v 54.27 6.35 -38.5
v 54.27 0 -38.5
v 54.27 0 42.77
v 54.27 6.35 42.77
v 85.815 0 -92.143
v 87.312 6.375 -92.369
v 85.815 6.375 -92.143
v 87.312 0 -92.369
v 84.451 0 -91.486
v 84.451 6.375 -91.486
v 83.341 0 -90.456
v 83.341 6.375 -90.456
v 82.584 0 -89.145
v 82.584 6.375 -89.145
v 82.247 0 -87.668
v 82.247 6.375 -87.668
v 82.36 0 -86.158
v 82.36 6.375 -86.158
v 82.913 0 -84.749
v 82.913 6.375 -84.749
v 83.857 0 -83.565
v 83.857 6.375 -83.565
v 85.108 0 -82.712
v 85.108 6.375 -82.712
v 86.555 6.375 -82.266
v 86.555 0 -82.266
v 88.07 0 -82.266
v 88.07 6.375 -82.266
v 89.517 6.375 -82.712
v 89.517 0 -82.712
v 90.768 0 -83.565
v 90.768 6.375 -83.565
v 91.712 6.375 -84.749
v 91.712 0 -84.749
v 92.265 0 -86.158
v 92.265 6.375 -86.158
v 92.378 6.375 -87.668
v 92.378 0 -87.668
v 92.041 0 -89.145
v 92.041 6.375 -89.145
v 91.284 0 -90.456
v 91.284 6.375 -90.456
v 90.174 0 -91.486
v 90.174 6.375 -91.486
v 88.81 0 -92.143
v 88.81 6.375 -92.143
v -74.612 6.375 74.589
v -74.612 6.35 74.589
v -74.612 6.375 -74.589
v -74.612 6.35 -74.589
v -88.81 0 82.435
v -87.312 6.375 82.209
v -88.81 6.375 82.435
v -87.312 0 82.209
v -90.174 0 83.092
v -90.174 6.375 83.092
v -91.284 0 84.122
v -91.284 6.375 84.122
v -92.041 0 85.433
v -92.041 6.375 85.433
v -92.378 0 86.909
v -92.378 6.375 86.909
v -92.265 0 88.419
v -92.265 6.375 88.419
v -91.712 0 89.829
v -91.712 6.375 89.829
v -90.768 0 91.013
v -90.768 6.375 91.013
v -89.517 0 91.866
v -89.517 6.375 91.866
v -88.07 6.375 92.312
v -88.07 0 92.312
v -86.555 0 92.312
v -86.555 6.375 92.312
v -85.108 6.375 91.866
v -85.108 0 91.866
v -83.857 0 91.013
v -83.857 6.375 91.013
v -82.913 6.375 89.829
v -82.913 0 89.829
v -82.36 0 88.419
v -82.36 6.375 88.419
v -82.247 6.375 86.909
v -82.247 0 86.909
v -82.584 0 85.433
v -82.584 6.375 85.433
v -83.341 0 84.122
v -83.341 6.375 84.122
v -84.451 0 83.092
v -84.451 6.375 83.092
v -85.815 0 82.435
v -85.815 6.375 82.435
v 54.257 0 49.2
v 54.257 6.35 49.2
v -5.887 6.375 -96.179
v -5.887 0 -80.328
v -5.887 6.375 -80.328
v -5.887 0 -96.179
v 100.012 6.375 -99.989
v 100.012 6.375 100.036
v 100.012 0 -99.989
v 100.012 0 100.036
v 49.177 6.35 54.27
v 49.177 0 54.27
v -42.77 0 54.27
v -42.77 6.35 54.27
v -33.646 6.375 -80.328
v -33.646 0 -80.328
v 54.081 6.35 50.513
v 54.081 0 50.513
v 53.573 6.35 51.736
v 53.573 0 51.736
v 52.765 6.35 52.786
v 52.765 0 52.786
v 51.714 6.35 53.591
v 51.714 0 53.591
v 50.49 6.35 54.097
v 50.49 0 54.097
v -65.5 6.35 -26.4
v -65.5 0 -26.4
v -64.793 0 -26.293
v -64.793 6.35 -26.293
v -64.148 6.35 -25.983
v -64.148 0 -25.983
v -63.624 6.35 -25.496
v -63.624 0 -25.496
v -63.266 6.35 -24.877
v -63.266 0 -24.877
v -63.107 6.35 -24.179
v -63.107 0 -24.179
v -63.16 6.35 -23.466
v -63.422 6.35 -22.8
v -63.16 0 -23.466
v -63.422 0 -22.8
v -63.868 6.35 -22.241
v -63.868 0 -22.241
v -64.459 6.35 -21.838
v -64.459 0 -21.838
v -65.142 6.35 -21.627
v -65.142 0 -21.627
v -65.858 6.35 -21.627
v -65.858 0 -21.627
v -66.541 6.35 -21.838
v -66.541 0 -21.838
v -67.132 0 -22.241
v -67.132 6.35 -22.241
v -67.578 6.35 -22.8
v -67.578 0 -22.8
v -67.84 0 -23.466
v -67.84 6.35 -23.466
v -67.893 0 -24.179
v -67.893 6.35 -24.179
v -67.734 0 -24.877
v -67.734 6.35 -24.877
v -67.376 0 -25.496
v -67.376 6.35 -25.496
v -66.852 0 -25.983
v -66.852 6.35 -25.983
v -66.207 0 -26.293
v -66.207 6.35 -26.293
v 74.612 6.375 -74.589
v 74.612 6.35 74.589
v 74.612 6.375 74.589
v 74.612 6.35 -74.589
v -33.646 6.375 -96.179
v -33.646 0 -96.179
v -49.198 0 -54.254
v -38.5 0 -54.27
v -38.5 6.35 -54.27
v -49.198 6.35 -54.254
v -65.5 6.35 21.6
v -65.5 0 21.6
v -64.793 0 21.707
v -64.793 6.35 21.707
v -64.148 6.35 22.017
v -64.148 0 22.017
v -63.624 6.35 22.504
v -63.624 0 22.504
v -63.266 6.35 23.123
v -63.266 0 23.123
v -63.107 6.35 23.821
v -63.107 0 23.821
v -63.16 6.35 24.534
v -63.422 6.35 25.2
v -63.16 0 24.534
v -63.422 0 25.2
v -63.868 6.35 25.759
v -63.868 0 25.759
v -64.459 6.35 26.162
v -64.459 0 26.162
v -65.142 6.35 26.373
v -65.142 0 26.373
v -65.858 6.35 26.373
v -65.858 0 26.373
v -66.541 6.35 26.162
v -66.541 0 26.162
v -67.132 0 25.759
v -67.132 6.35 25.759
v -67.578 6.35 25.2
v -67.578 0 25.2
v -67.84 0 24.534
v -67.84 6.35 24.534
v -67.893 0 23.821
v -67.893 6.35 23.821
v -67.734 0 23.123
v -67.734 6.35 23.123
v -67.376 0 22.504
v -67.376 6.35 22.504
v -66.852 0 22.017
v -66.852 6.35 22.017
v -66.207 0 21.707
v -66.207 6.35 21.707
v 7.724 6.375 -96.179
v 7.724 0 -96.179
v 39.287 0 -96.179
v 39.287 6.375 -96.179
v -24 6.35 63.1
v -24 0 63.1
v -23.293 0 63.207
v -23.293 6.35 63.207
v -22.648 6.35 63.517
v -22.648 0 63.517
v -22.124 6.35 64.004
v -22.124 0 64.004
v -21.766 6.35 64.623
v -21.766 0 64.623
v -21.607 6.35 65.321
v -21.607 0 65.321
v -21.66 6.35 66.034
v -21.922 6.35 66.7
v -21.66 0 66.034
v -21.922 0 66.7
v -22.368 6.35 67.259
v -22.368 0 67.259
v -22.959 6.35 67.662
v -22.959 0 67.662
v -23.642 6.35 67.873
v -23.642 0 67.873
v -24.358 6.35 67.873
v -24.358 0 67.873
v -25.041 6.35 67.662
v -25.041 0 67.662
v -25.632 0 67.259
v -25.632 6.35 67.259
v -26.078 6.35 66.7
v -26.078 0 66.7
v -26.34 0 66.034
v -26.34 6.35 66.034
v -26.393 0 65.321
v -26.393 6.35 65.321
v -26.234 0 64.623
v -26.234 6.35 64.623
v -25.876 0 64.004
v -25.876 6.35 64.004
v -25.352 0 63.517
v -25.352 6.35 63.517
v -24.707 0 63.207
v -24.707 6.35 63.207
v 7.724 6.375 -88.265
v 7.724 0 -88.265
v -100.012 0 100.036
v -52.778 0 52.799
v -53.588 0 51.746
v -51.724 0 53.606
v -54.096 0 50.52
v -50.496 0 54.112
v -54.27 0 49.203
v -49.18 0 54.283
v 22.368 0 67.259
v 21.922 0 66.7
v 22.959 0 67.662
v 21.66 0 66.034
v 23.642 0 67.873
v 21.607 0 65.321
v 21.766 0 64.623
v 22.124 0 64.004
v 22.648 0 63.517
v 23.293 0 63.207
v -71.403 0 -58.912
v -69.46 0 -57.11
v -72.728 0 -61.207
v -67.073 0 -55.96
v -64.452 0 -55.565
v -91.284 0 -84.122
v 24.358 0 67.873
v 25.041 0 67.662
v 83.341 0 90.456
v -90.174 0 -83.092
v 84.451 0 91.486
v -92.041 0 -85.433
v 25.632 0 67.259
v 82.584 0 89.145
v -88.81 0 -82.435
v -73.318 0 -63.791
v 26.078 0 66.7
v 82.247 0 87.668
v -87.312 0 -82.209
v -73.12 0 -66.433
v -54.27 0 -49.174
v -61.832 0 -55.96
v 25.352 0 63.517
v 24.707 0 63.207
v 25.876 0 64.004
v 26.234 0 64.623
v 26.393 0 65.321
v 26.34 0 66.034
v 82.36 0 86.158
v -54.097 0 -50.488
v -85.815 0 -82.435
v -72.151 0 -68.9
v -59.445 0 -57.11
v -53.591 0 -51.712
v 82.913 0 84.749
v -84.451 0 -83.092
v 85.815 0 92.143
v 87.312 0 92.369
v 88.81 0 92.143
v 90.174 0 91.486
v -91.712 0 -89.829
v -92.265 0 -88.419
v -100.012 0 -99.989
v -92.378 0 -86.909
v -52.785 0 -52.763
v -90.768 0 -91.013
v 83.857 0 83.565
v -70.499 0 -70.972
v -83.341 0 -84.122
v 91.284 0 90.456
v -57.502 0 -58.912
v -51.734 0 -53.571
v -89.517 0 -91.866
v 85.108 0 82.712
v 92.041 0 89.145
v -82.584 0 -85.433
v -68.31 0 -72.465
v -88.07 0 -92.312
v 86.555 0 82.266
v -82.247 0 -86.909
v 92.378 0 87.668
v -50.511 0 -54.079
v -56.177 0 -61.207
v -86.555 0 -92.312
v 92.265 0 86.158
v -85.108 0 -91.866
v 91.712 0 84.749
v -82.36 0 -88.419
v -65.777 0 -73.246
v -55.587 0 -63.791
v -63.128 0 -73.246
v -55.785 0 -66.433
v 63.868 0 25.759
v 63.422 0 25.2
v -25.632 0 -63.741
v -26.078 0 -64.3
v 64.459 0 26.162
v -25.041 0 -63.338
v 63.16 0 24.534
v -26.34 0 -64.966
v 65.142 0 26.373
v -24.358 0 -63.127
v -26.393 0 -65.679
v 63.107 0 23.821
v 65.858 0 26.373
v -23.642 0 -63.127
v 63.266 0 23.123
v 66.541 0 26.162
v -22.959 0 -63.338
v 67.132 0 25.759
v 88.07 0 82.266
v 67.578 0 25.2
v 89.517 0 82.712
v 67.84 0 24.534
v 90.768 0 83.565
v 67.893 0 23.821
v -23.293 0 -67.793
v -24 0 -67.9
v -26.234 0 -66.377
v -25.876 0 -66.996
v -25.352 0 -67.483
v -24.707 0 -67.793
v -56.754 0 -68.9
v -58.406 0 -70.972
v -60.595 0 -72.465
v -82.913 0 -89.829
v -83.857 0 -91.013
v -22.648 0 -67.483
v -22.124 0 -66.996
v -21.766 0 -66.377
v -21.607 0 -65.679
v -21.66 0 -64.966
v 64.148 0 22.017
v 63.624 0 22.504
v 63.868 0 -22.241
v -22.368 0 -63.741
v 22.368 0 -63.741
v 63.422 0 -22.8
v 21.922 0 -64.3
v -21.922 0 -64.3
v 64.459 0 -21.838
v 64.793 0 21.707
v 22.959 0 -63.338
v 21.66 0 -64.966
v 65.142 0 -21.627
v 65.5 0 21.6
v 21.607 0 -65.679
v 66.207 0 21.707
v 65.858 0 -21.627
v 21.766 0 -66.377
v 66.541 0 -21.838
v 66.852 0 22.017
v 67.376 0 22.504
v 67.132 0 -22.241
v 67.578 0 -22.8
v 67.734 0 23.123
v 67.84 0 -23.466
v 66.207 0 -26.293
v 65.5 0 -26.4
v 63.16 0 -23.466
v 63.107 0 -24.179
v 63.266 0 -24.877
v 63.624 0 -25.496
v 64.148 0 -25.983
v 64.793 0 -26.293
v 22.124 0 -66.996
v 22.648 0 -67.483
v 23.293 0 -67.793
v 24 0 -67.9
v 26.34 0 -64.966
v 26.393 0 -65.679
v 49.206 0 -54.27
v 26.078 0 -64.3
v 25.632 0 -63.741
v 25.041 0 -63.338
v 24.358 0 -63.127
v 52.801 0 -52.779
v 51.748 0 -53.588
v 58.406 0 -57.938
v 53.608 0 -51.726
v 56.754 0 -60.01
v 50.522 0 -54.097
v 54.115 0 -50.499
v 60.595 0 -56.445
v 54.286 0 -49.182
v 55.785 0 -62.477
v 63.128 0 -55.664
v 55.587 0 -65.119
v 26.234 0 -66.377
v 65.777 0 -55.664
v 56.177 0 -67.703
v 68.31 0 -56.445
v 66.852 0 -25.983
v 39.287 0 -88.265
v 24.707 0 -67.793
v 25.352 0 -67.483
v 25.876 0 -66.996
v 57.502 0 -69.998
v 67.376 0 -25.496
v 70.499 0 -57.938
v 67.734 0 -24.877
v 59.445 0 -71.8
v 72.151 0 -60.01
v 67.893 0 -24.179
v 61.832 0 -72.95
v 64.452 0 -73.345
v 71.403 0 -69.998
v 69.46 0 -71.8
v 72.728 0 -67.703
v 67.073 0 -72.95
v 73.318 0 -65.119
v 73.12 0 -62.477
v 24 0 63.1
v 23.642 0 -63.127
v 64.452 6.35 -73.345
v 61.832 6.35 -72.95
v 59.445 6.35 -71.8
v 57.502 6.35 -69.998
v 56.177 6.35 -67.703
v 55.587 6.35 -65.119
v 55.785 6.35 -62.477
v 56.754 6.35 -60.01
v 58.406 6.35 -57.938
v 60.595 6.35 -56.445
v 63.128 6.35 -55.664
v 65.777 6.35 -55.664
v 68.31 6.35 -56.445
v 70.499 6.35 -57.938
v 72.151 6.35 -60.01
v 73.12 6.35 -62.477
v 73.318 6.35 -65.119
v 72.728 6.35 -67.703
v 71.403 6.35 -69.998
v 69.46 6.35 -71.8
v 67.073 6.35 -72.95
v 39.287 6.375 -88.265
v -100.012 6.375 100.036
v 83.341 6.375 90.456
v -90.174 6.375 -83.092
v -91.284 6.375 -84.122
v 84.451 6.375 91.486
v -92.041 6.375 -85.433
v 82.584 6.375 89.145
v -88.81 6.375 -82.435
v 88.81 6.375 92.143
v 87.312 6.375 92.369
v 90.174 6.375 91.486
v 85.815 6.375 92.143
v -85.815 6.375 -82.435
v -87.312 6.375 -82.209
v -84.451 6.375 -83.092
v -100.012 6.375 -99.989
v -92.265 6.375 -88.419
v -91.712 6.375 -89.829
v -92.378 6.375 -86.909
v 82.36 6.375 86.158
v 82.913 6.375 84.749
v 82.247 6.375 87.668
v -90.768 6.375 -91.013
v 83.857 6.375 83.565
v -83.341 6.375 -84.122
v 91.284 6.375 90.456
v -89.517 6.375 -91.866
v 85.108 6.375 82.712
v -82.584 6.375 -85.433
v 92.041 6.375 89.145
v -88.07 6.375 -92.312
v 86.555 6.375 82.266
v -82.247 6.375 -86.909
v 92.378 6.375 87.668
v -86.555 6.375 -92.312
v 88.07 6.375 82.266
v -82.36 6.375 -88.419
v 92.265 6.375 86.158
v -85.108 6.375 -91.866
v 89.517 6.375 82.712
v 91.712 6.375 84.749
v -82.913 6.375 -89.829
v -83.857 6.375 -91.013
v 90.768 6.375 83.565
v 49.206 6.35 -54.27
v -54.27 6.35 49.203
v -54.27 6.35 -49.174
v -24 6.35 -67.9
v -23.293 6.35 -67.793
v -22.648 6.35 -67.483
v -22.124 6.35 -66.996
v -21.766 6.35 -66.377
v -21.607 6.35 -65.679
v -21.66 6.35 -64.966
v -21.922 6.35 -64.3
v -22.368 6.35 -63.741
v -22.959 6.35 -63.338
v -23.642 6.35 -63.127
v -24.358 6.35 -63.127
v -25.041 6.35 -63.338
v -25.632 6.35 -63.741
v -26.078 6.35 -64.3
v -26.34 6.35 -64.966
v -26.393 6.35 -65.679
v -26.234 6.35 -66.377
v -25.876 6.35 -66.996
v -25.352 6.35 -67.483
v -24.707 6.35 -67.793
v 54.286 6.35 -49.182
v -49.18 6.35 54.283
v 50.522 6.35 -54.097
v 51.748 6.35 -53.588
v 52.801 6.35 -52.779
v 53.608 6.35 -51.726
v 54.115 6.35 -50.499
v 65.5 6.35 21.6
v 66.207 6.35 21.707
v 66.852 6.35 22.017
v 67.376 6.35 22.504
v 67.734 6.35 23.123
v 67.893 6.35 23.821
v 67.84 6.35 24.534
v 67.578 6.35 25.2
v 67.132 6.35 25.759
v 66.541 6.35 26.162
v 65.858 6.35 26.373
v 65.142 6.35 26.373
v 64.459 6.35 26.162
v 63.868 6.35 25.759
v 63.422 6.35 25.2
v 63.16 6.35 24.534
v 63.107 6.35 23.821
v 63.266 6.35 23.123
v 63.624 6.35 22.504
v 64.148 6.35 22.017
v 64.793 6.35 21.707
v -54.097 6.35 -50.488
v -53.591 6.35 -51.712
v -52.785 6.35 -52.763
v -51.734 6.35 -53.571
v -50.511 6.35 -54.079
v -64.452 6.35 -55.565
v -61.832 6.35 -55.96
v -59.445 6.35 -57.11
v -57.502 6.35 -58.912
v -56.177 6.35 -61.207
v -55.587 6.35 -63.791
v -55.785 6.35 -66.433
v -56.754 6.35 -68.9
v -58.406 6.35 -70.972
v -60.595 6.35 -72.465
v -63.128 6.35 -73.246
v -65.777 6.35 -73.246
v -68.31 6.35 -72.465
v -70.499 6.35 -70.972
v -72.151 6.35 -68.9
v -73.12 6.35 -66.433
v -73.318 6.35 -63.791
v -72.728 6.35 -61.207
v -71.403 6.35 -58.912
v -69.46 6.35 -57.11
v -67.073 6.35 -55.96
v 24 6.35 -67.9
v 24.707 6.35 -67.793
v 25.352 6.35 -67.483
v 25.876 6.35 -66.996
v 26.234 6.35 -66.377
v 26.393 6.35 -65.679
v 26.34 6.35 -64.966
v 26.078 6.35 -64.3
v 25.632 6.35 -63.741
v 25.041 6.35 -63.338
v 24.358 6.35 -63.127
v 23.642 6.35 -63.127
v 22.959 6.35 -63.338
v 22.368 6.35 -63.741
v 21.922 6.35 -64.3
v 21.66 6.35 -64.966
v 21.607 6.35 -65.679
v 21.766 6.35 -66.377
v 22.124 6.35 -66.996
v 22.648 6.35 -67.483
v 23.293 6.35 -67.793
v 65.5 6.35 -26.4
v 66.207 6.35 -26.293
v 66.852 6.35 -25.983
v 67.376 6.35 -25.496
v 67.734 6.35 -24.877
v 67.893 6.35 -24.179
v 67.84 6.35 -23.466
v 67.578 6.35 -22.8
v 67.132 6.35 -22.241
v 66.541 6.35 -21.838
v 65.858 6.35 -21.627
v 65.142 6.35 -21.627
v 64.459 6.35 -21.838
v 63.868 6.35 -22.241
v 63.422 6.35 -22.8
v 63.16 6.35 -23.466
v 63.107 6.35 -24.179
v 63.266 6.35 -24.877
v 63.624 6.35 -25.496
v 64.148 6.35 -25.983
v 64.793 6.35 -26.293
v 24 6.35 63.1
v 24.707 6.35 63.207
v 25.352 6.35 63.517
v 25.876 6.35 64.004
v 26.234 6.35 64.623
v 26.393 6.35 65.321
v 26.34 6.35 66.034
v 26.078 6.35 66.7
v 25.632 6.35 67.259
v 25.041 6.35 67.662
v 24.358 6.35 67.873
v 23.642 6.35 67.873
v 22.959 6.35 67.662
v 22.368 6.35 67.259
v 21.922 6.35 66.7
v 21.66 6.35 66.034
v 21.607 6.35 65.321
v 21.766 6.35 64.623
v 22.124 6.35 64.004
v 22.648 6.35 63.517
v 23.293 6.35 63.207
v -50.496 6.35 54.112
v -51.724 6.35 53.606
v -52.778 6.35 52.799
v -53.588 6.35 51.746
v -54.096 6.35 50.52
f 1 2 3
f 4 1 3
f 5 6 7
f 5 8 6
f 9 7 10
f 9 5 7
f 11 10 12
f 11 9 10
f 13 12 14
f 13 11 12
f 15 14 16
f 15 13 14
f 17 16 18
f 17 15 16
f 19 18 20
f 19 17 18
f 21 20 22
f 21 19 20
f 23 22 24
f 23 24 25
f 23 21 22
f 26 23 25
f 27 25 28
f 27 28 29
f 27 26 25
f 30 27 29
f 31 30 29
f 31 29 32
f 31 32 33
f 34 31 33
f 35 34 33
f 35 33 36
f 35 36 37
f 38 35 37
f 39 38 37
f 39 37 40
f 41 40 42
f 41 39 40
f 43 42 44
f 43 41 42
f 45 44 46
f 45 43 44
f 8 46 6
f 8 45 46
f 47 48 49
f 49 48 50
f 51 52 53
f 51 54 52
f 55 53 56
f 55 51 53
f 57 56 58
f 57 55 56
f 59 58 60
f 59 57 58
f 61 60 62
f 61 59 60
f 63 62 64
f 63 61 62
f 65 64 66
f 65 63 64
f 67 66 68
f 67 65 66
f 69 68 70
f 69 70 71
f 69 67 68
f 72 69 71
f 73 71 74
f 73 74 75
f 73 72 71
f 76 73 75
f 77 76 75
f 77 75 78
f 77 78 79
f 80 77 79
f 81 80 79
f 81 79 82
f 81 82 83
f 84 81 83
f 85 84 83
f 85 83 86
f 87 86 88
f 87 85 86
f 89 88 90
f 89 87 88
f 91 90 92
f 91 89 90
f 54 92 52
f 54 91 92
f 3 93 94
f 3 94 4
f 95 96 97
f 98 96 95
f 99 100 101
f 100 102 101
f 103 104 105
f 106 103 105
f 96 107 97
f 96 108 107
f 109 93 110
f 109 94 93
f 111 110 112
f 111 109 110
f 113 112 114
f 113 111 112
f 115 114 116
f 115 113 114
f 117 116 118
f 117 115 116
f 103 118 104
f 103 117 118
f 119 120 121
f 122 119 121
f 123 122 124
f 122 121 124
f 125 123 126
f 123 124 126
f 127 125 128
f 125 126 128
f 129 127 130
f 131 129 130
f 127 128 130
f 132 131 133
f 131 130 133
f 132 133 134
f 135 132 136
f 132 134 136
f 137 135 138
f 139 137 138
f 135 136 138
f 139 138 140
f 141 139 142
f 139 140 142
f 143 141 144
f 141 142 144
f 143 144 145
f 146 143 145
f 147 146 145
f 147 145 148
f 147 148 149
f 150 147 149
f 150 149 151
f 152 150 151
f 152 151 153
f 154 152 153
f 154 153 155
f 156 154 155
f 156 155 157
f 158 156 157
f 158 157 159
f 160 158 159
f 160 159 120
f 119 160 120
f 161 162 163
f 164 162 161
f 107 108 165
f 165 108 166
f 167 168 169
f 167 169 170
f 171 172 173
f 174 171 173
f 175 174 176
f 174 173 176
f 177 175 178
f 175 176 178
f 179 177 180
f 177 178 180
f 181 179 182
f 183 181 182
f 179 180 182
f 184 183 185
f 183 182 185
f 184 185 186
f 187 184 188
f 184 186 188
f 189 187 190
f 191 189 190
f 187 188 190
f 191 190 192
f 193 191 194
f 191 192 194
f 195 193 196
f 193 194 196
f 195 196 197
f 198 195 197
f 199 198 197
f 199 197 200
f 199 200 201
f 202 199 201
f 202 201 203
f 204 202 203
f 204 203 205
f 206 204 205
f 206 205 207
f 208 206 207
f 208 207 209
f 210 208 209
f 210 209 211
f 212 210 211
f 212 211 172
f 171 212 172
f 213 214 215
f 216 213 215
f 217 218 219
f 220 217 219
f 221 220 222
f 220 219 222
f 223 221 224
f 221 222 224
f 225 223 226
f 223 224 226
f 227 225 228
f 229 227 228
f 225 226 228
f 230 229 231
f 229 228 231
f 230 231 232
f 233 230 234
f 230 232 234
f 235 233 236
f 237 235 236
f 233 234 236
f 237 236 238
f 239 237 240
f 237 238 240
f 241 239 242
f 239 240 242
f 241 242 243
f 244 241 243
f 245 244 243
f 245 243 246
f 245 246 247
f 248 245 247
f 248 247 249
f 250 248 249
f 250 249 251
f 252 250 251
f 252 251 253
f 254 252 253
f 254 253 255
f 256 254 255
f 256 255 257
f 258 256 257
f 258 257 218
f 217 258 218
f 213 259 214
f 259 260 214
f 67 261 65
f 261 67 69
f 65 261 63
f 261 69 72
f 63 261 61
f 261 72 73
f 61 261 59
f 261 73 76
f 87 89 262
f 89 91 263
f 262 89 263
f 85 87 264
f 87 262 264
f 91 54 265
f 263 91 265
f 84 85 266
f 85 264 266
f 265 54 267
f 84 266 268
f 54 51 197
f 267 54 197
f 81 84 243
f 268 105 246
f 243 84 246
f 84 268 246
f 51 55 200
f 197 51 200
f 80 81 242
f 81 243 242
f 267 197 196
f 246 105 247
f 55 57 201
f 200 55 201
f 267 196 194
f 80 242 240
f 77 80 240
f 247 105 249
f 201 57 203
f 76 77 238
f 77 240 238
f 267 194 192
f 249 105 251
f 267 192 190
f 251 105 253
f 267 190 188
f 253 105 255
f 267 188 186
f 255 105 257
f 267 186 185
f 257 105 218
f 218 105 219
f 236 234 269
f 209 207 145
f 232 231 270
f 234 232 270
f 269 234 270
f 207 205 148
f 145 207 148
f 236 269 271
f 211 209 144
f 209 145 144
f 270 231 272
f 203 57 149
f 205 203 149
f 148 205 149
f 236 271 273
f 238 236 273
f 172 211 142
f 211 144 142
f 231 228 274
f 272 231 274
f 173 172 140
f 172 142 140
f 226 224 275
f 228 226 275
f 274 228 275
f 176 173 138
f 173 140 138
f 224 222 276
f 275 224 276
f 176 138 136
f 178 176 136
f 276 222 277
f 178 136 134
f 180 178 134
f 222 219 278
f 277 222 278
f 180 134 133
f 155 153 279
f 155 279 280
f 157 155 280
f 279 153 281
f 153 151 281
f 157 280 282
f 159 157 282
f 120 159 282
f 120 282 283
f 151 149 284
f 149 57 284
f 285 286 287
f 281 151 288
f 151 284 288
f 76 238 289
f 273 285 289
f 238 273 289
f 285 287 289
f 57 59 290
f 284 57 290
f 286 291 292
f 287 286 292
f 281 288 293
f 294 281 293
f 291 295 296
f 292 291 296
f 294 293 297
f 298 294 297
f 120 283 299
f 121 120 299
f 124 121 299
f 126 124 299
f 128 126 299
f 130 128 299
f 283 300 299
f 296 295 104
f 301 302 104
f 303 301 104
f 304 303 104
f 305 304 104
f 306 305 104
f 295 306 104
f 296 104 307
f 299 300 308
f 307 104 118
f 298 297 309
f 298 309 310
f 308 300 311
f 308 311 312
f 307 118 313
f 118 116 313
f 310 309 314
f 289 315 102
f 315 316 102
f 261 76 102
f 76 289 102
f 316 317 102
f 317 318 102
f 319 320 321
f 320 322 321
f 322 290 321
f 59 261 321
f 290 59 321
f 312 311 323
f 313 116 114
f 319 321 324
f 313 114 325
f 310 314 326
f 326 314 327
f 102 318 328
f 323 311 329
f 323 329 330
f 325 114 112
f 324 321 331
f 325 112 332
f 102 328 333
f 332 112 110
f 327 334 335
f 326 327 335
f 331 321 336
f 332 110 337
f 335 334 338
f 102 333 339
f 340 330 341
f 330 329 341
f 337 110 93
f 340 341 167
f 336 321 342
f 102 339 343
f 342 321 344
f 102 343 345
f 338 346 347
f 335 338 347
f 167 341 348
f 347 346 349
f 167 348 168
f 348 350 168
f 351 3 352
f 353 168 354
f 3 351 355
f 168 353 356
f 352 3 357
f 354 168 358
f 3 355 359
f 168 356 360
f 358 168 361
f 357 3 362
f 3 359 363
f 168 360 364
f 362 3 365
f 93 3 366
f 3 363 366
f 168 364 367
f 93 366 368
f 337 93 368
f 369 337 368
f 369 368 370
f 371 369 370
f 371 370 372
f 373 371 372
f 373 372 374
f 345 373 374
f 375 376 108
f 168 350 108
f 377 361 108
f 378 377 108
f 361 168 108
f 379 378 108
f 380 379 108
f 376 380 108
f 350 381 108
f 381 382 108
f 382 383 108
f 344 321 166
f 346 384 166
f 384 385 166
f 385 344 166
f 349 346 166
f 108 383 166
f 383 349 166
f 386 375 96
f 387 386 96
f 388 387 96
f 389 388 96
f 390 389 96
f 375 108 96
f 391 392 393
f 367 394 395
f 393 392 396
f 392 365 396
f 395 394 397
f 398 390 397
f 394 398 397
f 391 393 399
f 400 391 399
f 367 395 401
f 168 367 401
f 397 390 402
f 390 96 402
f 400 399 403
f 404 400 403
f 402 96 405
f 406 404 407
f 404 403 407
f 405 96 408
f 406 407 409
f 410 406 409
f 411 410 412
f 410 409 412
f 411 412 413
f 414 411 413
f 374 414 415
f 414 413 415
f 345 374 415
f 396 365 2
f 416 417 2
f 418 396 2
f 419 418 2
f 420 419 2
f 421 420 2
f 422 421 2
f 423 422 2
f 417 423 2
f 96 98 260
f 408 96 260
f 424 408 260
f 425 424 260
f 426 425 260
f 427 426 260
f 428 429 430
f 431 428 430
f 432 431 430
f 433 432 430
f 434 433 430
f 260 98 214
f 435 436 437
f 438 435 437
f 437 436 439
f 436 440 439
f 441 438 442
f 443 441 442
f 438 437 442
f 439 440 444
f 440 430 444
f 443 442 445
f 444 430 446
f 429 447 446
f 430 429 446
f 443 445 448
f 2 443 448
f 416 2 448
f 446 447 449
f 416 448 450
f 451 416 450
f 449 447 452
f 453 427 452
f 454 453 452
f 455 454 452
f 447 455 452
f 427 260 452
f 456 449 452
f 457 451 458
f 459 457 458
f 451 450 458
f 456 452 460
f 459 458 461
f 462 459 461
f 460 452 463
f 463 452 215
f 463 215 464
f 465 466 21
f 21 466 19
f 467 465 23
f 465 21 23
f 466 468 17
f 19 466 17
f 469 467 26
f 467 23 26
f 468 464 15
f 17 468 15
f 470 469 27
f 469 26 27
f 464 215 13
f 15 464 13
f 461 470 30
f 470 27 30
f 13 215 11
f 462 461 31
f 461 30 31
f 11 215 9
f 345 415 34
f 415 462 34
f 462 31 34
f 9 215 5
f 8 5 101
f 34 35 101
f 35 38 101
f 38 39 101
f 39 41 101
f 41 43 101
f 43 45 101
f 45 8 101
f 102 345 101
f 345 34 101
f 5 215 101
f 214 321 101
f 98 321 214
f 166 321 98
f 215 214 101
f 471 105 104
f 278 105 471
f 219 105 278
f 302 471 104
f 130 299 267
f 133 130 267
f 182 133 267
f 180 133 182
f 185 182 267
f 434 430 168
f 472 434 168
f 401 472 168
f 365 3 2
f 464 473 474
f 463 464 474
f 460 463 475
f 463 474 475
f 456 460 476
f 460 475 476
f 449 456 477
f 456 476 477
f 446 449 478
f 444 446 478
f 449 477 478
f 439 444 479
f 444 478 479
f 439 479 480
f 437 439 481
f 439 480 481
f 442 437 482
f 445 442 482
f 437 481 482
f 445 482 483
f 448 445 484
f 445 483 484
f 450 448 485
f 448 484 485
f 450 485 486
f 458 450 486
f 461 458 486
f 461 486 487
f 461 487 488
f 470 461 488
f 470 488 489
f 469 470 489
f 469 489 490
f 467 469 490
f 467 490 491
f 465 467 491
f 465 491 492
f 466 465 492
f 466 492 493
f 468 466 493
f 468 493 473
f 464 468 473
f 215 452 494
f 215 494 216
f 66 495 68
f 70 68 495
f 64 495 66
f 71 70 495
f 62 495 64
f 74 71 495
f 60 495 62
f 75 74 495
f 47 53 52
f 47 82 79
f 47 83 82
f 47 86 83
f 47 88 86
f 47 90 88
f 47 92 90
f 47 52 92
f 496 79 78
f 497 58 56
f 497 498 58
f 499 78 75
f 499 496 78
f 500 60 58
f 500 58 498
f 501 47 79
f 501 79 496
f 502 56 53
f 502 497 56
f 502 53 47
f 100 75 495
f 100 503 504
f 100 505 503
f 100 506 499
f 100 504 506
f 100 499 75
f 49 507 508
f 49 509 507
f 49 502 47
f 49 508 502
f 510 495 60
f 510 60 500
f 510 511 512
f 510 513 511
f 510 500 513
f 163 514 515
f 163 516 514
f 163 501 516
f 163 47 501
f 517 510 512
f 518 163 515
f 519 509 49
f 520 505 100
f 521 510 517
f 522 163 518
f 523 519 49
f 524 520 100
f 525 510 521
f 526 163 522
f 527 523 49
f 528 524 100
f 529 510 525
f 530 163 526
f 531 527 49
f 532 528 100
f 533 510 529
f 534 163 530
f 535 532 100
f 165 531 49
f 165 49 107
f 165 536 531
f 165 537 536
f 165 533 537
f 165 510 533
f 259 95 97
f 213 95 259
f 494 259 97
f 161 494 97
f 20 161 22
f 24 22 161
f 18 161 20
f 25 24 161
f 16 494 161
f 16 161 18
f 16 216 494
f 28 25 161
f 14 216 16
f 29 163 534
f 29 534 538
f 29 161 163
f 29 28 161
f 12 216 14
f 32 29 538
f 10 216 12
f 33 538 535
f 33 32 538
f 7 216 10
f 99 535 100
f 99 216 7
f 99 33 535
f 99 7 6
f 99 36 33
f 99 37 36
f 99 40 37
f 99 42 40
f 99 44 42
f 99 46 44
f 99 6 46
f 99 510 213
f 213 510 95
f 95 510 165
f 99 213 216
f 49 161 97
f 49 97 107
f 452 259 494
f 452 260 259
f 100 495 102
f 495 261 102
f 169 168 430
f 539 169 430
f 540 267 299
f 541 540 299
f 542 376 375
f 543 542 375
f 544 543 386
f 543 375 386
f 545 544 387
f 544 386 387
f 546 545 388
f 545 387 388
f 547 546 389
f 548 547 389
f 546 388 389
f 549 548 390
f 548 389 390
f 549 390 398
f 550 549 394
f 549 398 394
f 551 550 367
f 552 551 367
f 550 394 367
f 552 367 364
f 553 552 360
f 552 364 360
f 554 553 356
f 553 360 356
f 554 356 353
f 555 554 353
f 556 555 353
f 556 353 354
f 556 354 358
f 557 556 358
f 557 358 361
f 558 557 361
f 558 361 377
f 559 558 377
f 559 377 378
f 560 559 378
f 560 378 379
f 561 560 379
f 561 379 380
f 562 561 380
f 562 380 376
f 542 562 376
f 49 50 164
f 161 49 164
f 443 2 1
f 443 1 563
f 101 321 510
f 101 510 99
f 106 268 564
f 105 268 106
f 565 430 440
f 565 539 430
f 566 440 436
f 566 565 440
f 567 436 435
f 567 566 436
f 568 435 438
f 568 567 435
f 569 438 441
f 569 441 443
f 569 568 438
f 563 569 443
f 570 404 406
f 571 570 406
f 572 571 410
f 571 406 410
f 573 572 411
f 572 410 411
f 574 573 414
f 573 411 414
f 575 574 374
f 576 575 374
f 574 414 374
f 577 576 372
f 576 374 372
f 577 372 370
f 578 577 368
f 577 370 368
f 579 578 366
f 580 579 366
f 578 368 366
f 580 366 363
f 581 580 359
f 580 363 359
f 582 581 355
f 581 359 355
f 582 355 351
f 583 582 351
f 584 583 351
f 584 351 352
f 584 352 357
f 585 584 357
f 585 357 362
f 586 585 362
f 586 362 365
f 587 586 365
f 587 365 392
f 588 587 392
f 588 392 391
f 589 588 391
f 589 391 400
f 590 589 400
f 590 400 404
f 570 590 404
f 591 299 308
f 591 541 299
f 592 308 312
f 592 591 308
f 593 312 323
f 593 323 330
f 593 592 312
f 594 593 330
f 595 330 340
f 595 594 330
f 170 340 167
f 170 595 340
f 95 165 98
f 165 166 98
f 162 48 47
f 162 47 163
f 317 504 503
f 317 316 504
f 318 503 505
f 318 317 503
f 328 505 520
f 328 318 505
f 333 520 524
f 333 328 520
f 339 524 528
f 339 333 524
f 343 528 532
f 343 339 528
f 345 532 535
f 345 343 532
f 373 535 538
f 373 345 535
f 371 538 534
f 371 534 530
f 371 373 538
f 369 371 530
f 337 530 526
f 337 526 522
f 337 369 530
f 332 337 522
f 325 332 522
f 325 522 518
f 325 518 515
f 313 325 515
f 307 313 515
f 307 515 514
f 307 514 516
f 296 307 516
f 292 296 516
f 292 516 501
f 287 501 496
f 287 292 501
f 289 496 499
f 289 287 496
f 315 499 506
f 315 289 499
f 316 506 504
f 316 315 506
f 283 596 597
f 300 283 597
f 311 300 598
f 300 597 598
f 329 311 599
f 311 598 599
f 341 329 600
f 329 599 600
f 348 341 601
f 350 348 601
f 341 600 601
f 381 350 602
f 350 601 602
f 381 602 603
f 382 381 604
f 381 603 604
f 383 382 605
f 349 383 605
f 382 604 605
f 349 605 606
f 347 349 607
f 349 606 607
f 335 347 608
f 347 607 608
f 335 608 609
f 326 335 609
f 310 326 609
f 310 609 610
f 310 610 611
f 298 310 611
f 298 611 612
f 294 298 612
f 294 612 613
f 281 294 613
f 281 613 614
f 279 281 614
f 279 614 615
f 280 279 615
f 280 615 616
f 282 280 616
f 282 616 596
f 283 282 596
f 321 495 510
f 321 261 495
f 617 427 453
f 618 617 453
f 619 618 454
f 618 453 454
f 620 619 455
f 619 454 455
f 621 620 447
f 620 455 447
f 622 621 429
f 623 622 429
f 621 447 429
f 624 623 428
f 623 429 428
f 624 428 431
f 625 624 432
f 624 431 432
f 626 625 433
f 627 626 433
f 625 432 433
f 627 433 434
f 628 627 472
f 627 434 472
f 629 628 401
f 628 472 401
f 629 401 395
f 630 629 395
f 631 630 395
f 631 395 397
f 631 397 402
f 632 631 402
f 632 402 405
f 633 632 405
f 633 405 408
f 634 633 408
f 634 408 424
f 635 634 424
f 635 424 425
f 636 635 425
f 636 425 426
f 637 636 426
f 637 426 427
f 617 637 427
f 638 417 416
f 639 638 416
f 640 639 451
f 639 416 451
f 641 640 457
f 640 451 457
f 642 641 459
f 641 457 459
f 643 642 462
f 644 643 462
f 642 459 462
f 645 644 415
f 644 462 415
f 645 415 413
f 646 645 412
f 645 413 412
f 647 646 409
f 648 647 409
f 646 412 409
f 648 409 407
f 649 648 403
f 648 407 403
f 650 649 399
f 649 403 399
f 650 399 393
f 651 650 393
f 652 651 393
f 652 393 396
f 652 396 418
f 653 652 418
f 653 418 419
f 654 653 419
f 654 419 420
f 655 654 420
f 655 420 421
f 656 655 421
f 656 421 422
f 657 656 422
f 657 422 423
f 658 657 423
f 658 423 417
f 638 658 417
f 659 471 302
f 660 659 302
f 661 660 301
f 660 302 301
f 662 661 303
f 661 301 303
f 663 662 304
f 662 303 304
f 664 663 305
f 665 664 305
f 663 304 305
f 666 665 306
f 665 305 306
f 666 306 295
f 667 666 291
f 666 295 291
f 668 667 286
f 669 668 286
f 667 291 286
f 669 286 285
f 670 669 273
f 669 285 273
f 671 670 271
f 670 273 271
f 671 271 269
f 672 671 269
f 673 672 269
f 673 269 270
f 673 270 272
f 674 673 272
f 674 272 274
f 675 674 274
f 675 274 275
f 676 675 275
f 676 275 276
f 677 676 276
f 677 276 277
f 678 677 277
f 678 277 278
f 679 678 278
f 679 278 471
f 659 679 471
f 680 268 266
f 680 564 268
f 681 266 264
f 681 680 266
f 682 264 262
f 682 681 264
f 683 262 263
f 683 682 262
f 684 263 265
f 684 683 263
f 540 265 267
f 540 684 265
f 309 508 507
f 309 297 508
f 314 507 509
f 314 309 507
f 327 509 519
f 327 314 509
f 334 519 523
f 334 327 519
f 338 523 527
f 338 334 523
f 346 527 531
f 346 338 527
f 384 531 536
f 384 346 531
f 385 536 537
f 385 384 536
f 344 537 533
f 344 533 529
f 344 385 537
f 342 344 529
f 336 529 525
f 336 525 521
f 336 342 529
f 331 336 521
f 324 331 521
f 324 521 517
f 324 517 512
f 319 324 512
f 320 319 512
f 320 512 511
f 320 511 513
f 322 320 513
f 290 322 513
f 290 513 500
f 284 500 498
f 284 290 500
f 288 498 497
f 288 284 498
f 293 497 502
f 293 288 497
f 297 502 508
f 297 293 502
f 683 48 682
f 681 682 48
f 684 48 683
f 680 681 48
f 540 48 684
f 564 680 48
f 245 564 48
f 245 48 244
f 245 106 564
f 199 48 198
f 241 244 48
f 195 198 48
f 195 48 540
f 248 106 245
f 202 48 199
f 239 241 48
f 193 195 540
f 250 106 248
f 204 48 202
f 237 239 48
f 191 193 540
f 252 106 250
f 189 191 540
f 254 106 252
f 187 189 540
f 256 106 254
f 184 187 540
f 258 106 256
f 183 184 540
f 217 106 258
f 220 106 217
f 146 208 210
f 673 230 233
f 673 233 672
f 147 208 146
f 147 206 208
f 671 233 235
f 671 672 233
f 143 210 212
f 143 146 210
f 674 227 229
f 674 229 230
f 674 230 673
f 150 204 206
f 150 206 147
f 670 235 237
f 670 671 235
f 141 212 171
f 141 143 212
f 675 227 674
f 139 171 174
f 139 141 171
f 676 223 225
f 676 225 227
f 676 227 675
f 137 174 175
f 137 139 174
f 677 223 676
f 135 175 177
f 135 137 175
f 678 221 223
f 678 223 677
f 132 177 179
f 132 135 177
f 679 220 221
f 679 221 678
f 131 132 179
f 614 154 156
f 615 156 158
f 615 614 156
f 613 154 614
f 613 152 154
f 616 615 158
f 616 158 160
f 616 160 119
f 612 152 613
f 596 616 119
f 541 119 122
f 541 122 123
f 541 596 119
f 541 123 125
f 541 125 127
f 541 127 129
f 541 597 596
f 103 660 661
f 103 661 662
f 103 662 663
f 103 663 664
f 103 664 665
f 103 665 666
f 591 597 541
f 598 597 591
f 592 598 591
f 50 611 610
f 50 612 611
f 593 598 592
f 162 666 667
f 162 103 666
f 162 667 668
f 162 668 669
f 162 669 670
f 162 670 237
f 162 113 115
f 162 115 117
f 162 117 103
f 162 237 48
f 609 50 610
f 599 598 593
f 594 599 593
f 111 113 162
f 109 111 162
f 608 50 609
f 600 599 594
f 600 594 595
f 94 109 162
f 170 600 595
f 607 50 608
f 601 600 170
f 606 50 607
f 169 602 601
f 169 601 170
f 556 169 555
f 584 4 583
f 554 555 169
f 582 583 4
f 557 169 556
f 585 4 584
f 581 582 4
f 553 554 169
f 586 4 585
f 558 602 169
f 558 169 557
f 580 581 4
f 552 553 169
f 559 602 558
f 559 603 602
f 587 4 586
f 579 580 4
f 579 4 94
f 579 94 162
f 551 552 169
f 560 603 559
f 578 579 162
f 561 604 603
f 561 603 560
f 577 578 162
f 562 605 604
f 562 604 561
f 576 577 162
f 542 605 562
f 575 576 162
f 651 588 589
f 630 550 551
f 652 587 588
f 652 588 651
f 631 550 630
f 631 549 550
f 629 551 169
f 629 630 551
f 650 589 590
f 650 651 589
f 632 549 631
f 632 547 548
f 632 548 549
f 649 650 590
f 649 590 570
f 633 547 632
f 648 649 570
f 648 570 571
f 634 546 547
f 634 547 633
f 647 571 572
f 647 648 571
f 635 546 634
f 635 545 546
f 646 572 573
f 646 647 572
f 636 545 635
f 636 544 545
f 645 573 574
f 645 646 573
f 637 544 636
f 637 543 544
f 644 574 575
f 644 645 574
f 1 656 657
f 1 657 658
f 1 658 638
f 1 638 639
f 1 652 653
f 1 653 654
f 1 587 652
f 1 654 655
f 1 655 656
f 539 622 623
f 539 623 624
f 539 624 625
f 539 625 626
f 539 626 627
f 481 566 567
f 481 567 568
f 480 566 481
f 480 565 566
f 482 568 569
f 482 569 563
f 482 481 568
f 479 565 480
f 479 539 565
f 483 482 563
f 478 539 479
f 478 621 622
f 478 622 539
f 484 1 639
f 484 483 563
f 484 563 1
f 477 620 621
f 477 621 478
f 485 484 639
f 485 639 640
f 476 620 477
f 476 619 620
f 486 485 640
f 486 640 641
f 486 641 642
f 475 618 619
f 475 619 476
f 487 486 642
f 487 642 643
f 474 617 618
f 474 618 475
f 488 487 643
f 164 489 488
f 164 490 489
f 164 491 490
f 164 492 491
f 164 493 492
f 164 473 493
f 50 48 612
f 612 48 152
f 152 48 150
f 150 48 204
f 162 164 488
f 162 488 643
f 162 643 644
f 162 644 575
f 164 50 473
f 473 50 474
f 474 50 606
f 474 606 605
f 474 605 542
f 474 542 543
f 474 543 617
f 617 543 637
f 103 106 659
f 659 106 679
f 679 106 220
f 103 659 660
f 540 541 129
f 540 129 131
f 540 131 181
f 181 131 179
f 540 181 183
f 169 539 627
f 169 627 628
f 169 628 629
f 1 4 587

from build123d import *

# Parameters (mm, degrees)
SKETCH1_W           = 200.025
SKETCH1_H           = 200.025
SKETCH1_R           = 5.08
SKETCH1_W_2         = 27.758924323
SKETCH1_H_2         = 15.850492031
SKETCH1_W_3         = 31.563171913
SKETCH1_H_3         = 7.913427648
BOSS_EXTRUDE1_DEPTH = 6.35
FILLET1_R           = 5.08
SKETCH3_R           = 2.4
CUT_EXTRUDE1_DEPTH  = 142.598203764
SKETCH4_W           = 200.025
SKETCH4_H           = 200.025
SKETCH4_R           = 5.08
SKETCH4_W_2         = 149.225
SKETCH4_H_2         = 149.17772653
SKETCH4_W_3         = 27.758924323
SKETCH4_H_3         = 15.850492031
SKETCH4_W_4         = 31.563171913
SKETCH4_H_4         = 7.913427648
BOSS_EXTRUDE2_DEPTH = 0.0254
SKETCH5_R           = 8.89
CUT_EXTRUDE2_DEPTH  = 142.598203764


with BuildPart() as part:
    # Sketch1 → Boss-Extrude1 (new body)
    with BuildSketch(Plane(origin=(0, 0, 0), x_dir=(1, 0, 0), z_dir=(0, 1, 0))):
        with Locations((0, -0.023636735)):
            Rectangle(SKETCH1_W, SKETCH1_H)
        with Locations(Location((-87.3125, 87.288863265, 0), (0, 0, 270))):
            Circle(SKETCH1_R, mode=Mode.SUBTRACT)
        with Locations(Location((87.3125, 87.288863265, 0), (0, 0, 90))):
            Circle(SKETCH1_R, mode=Mode.SUBTRACT)
        with Locations(Location((-87.3125, -87.288863265, 0), (0, 0, 90))):
            Circle(SKETCH1_R, mode=Mode.SUBTRACT)
        with Locations(Location((87.3125, -87.288863265, 0), (0, 0, 270))):
            Circle(SKETCH1_R, mode=Mode.SUBTRACT)
        with Locations((-19.766444167, 88.253617249)):
            Rectangle(SKETCH1_W_2, SKETCH1_H_2, mode=Mode.SUBTRACT)
        with Locations((23.505506165, 92.222149441)):
            Rectangle(SKETCH1_W_3, SKETCH1_H_3, mode=Mode.SUBTRACT)
        Polygon((54.27, -38.5), (54.27, 38.5), (54.293636735, 54.27), (38.5, 54.27), (-38.5, 54.27), (-54.27, 54.246363265), (-54.27, 38.5), (-54.27, -38.5), (-54.27, -54.293636735), (-42.77, -54.27), (-38.5, -54.27), (38.5, -54.27), (42.77, -54.27), (54.246363265, -54.27), (54.27, -42.77), align=None, mode=Mode.SUBTRACT)
    extrude(amount=BOSS_EXTRUDE1_DEPTH)

    # Fillet1
    fillet1_edges = [part.edges().sort_by_distance(p)[0] for p in [
        (-54.27, 3.175, -54.246363265),
        (-54.27, 3.175, 54.293636735),
        (54.246363265, 3.175, 54.27),
        (54.293636735, 3.175, -54.27),
    ]]
    fillet(fillet1_edges, radius=FILLET1_R)

    # Sketch3 → Cut-Extrude1 (cut, through all)
    with BuildSketch(Plane.XZ):
        with Locations(Location((-24, 65.5, 0), (0, 0, 270))):
            Circle(SKETCH3_R)
        with Locations(Location((24, 65.5, 0), (0, 0, 270))):
            Circle(SKETCH3_R)
        with Locations(Location((65.5, 24, 0), (0, 0, 270))):
            Circle(SKETCH3_R)
        with Locations(Location((65.5, -24, 0), (0, 0, 270))):
            Circle(SKETCH3_R)
        with Locations(Location((24, -65.5, 0), (0, 0, 270))):
            Circle(SKETCH3_R)
        with Locations(Location((-24, -65.5, 0), (0, 0, 270))):
            Circle(SKETCH3_R)
        with Locations(Location((-65.5, -24, 0), (0, 0, 270))):
            Circle(SKETCH3_R)
        with Locations(Location((-65.5, 24, 0), (0, 0, 270))):
            Circle(SKETCH3_R)
    extrude(amount=-CUT_EXTRUDE1_DEPTH, mode=Mode.SUBTRACT)

    # Sketch4 → Boss-Extrude2 (add)
    with BuildSketch(Plane(origin=(0, 6.35, 0), x_dir=(1, 0, 0), z_dir=(0, 1, 0))):
        with Locations((0, -0.023636735)):
            Rectangle(SKETCH4_W, SKETCH4_H)
        with Locations(Location((-87.3125, 87.288863265, 0), (0, 0, 270))):
            Circle(SKETCH4_R, mode=Mode.SUBTRACT)
        with Locations(Location((87.3125, 87.288863265, 0), (0, 0, 90))):
            Circle(SKETCH4_R, mode=Mode.SUBTRACT)
        with Locations(Location((87.3125, -87.288863265, 0), (0, 0, 270))):
            Circle(SKETCH4_R, mode=Mode.SUBTRACT)
        with Locations(Location((-87.3125, -87.288863265, 0), (0, 0, 90))):
            Circle(SKETCH4_R, mode=Mode.SUBTRACT)
        Rectangle(SKETCH4_W_2, SKETCH4_H_2, mode=Mode.SUBTRACT)
        with Locations((-19.766444167, 88.253617249)):
            Rectangle(SKETCH4_W_3, SKETCH4_H_3, mode=Mode.SUBTRACT)
        with Locations((23.505506165, 92.222149441)):
            Rectangle(SKETCH4_W_4, SKETCH4_H_4, mode=Mode.SUBTRACT)
    extrude(amount=BOSS_EXTRUDE2_DEPTH)

    # Sketch5 → Cut-Extrude2 (cut, through all)
    with BuildSketch(Plane(origin=(0, 6.35, 0), x_dir=(1, 0, 0), z_dir=(0, 1, 0))):
        with Locations(Location((-64.4525, 64.455022357, 0), (0, 0, 270))):
            Circle(SKETCH5_R)
        with Locations(Location((64.4525, 64.455022357, 0), (0, 0, 90))):
            Circle(SKETCH5_R)
    extrude(amount=-CUT_EXTRUDE2_DEPTH, mode=Mode.SUBTRACT)


solid = part.part
